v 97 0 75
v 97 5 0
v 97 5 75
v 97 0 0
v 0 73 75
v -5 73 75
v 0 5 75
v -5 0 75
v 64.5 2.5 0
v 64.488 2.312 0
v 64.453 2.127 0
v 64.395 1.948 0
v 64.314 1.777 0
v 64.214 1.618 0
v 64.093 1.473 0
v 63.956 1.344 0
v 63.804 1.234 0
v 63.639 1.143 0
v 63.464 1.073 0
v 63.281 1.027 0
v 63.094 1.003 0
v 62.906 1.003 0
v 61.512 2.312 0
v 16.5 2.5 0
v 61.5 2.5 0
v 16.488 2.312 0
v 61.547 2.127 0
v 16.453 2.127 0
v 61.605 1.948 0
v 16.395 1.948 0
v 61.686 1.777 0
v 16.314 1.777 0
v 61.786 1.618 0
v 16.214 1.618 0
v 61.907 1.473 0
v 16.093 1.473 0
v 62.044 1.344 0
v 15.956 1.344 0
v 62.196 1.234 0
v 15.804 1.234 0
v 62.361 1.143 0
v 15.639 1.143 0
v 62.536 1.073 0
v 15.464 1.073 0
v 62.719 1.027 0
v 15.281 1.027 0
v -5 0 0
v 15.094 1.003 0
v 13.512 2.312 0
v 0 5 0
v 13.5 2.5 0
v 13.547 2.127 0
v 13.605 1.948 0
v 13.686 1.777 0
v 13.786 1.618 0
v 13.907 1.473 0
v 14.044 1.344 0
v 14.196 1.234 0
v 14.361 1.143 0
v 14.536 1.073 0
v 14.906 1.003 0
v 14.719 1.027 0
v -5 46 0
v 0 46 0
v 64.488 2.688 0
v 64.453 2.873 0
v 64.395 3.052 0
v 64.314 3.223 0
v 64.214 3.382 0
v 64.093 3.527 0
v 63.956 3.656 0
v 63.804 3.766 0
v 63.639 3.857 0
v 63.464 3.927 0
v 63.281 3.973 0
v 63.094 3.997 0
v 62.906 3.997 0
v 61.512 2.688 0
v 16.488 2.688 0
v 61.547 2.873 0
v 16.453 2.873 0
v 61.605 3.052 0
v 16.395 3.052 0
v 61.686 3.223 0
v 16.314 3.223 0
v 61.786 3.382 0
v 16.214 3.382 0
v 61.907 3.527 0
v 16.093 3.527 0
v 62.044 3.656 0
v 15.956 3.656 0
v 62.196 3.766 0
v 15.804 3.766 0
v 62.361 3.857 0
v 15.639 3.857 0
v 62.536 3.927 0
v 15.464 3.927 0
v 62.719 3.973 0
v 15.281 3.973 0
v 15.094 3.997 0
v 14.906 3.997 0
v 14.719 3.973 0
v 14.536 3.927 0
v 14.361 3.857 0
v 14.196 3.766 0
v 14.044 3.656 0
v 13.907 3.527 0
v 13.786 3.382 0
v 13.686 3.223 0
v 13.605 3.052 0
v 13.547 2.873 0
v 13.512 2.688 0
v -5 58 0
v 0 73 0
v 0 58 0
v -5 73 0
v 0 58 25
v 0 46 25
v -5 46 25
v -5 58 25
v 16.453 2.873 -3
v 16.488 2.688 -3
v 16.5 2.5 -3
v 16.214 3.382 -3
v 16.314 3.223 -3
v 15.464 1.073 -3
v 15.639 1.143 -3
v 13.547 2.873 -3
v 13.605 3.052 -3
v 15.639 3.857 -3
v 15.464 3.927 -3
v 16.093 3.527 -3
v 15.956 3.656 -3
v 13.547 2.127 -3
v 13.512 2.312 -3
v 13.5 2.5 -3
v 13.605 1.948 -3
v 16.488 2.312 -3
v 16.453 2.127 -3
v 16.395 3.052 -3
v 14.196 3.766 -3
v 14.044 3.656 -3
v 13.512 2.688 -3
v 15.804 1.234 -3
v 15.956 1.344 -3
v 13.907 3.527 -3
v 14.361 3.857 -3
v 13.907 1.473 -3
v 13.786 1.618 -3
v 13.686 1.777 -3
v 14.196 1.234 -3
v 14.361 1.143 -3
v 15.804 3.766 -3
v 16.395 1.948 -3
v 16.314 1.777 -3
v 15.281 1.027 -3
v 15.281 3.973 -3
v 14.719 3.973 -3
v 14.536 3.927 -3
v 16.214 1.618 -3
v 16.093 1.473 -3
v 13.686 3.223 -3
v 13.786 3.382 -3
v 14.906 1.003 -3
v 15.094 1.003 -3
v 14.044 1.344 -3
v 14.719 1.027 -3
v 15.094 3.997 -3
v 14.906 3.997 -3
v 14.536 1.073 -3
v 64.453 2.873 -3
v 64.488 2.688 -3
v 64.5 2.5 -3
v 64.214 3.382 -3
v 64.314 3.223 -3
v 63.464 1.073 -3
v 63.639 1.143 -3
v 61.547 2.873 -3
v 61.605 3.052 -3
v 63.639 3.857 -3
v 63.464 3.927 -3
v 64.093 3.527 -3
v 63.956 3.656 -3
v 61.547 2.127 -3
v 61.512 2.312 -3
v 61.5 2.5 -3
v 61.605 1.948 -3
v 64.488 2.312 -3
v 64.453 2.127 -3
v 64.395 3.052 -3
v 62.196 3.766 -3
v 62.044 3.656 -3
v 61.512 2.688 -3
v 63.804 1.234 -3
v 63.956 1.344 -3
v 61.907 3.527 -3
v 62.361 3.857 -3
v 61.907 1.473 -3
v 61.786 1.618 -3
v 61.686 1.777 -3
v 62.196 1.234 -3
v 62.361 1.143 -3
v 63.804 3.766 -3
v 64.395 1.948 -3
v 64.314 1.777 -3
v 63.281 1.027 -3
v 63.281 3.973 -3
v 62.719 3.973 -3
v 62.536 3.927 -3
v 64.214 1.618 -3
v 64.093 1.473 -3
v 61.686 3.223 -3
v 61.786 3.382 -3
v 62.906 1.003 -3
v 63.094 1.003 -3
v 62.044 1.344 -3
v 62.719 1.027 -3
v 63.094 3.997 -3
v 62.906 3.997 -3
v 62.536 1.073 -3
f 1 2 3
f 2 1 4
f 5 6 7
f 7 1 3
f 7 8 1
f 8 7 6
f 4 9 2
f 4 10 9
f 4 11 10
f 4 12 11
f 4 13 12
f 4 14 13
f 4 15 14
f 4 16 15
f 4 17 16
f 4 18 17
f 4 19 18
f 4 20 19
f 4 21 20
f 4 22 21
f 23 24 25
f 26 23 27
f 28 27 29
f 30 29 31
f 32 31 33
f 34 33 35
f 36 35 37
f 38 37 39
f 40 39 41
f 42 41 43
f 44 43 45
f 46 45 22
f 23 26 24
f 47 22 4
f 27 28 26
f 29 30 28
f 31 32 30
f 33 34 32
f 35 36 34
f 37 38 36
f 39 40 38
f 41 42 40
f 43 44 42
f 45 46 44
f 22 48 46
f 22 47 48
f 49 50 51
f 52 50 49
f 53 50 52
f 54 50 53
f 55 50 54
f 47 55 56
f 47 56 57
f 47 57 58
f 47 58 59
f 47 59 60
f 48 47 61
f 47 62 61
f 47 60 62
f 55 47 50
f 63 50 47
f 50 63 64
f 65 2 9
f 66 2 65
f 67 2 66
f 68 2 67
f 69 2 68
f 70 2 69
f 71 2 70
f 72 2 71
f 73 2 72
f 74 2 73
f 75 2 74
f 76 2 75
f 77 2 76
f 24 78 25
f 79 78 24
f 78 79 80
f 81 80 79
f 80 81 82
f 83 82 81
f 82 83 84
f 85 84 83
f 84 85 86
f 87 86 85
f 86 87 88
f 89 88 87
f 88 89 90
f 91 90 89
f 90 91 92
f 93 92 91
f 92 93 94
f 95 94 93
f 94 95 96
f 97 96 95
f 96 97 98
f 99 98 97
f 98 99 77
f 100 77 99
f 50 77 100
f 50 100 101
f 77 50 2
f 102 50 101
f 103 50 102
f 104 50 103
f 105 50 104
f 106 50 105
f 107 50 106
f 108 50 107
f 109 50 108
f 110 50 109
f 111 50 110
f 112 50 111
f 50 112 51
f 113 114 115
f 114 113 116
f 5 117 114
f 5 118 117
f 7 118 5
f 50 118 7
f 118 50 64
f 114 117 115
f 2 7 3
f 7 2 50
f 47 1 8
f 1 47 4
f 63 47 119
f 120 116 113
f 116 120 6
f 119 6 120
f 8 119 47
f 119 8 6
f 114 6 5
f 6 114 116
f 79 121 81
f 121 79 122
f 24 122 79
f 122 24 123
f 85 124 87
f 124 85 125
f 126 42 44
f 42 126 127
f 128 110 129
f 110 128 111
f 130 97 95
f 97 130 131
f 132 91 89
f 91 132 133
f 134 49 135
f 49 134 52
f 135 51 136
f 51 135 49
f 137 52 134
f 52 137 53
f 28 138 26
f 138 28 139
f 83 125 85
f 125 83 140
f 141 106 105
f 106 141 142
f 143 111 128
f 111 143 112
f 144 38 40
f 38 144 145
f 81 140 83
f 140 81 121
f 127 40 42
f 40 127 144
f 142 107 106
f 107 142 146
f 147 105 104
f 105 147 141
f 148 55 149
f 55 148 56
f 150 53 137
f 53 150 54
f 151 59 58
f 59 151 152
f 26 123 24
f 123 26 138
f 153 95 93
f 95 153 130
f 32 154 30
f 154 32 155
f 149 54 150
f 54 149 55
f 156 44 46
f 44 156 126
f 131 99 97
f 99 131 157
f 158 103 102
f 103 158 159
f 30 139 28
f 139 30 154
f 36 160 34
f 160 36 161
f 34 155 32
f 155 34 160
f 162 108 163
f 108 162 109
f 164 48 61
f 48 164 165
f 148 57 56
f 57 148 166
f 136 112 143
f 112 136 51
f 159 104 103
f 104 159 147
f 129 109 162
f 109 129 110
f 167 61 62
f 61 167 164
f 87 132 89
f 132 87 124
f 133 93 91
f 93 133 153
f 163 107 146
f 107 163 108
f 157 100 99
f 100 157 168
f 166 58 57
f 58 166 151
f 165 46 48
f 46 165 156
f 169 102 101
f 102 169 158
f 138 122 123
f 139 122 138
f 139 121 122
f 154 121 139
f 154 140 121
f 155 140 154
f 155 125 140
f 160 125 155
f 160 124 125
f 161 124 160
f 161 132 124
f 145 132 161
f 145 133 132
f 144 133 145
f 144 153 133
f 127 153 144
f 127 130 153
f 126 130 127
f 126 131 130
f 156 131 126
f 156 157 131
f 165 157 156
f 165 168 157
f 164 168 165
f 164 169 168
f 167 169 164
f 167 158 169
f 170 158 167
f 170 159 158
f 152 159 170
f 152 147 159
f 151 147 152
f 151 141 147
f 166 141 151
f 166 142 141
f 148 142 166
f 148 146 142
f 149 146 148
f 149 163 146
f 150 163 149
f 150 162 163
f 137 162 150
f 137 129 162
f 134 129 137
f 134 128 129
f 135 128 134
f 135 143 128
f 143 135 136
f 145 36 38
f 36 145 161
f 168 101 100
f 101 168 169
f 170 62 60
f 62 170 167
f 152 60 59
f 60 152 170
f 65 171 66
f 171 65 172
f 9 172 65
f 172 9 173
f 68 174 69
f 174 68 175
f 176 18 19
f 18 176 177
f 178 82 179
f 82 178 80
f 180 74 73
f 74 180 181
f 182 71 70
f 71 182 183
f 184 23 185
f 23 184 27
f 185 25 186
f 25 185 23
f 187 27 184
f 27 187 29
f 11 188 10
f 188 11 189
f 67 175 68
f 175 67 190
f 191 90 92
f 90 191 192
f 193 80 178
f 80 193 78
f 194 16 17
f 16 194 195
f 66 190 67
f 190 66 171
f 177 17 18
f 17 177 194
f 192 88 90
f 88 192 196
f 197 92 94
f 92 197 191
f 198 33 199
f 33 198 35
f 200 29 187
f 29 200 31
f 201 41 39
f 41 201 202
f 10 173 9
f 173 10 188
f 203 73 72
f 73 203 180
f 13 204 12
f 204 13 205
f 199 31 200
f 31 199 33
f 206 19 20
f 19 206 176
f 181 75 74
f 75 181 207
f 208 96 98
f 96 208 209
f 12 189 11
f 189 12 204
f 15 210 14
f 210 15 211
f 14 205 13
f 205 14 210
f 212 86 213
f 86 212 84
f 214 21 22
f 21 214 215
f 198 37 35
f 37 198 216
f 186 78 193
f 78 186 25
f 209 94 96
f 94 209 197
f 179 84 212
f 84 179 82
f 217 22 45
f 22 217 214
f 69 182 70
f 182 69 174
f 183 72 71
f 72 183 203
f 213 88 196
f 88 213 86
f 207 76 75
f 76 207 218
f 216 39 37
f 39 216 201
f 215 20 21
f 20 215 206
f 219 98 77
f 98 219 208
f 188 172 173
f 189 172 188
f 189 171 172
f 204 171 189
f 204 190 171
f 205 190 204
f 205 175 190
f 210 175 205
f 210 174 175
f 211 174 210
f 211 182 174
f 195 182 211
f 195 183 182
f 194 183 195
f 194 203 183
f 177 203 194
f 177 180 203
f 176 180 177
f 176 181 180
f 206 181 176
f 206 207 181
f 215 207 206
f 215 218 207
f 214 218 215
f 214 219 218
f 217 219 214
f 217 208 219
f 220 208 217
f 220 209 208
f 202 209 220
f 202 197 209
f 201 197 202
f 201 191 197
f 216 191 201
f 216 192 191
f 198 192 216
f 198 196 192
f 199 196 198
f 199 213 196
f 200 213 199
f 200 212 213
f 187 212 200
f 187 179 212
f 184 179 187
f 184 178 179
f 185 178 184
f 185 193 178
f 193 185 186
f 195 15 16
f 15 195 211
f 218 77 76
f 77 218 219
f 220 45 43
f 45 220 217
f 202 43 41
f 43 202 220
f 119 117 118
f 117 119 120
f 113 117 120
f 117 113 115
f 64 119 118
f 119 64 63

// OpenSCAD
//Spessore parete del corridoio, con la porta
spessore_uno=5; 
//lunghezza della prima parete
lunghezza_uno=73; 

//spessore parete divisoria degli ambienti
spessore_due=5;
lunghezza_due = 97; 
//
//altezza uguale per tutte le pareti
altezza=75; 

//dati relativi alla porta
altezza_porta = 25; 
larghezza_porta = 12;
//distanza della porta a partire dall'angolo esterno
distanza_porta = 46;

//parametri relativi alle finestre, ma non ancora inseriti nel modello
lunghezza_fin=15;
 altezza_fin=11;

due_pareti_porta();

module due_pareti(){
   union(){
    cube([lunghezza_due, spessore_due, altezza]);
   rotate([0,0,90])    cube([lunghezza_uno, spessore_uno, altezza]);
    translate([15,spessore_uno/2,-3])cylinder(10, 1.5,1.5, $fn=50);
    translate([lunghezza_uno-10,spessore_uno/2,-3])cylinder(10, 1.5,1.5, $fn=50);
   }
}


module due_pareti_porta(){
    
    difference(){
        due_pareti();
        translate([-spessore_due,distanza_porta,0]) cube([spessore_due,larghezza_porta,altezza_porta]);
    }
}

module finestra(){
    
    cube([lunghezza_fin, spessore, altezza_fin]);
    
    }
    
    
    
